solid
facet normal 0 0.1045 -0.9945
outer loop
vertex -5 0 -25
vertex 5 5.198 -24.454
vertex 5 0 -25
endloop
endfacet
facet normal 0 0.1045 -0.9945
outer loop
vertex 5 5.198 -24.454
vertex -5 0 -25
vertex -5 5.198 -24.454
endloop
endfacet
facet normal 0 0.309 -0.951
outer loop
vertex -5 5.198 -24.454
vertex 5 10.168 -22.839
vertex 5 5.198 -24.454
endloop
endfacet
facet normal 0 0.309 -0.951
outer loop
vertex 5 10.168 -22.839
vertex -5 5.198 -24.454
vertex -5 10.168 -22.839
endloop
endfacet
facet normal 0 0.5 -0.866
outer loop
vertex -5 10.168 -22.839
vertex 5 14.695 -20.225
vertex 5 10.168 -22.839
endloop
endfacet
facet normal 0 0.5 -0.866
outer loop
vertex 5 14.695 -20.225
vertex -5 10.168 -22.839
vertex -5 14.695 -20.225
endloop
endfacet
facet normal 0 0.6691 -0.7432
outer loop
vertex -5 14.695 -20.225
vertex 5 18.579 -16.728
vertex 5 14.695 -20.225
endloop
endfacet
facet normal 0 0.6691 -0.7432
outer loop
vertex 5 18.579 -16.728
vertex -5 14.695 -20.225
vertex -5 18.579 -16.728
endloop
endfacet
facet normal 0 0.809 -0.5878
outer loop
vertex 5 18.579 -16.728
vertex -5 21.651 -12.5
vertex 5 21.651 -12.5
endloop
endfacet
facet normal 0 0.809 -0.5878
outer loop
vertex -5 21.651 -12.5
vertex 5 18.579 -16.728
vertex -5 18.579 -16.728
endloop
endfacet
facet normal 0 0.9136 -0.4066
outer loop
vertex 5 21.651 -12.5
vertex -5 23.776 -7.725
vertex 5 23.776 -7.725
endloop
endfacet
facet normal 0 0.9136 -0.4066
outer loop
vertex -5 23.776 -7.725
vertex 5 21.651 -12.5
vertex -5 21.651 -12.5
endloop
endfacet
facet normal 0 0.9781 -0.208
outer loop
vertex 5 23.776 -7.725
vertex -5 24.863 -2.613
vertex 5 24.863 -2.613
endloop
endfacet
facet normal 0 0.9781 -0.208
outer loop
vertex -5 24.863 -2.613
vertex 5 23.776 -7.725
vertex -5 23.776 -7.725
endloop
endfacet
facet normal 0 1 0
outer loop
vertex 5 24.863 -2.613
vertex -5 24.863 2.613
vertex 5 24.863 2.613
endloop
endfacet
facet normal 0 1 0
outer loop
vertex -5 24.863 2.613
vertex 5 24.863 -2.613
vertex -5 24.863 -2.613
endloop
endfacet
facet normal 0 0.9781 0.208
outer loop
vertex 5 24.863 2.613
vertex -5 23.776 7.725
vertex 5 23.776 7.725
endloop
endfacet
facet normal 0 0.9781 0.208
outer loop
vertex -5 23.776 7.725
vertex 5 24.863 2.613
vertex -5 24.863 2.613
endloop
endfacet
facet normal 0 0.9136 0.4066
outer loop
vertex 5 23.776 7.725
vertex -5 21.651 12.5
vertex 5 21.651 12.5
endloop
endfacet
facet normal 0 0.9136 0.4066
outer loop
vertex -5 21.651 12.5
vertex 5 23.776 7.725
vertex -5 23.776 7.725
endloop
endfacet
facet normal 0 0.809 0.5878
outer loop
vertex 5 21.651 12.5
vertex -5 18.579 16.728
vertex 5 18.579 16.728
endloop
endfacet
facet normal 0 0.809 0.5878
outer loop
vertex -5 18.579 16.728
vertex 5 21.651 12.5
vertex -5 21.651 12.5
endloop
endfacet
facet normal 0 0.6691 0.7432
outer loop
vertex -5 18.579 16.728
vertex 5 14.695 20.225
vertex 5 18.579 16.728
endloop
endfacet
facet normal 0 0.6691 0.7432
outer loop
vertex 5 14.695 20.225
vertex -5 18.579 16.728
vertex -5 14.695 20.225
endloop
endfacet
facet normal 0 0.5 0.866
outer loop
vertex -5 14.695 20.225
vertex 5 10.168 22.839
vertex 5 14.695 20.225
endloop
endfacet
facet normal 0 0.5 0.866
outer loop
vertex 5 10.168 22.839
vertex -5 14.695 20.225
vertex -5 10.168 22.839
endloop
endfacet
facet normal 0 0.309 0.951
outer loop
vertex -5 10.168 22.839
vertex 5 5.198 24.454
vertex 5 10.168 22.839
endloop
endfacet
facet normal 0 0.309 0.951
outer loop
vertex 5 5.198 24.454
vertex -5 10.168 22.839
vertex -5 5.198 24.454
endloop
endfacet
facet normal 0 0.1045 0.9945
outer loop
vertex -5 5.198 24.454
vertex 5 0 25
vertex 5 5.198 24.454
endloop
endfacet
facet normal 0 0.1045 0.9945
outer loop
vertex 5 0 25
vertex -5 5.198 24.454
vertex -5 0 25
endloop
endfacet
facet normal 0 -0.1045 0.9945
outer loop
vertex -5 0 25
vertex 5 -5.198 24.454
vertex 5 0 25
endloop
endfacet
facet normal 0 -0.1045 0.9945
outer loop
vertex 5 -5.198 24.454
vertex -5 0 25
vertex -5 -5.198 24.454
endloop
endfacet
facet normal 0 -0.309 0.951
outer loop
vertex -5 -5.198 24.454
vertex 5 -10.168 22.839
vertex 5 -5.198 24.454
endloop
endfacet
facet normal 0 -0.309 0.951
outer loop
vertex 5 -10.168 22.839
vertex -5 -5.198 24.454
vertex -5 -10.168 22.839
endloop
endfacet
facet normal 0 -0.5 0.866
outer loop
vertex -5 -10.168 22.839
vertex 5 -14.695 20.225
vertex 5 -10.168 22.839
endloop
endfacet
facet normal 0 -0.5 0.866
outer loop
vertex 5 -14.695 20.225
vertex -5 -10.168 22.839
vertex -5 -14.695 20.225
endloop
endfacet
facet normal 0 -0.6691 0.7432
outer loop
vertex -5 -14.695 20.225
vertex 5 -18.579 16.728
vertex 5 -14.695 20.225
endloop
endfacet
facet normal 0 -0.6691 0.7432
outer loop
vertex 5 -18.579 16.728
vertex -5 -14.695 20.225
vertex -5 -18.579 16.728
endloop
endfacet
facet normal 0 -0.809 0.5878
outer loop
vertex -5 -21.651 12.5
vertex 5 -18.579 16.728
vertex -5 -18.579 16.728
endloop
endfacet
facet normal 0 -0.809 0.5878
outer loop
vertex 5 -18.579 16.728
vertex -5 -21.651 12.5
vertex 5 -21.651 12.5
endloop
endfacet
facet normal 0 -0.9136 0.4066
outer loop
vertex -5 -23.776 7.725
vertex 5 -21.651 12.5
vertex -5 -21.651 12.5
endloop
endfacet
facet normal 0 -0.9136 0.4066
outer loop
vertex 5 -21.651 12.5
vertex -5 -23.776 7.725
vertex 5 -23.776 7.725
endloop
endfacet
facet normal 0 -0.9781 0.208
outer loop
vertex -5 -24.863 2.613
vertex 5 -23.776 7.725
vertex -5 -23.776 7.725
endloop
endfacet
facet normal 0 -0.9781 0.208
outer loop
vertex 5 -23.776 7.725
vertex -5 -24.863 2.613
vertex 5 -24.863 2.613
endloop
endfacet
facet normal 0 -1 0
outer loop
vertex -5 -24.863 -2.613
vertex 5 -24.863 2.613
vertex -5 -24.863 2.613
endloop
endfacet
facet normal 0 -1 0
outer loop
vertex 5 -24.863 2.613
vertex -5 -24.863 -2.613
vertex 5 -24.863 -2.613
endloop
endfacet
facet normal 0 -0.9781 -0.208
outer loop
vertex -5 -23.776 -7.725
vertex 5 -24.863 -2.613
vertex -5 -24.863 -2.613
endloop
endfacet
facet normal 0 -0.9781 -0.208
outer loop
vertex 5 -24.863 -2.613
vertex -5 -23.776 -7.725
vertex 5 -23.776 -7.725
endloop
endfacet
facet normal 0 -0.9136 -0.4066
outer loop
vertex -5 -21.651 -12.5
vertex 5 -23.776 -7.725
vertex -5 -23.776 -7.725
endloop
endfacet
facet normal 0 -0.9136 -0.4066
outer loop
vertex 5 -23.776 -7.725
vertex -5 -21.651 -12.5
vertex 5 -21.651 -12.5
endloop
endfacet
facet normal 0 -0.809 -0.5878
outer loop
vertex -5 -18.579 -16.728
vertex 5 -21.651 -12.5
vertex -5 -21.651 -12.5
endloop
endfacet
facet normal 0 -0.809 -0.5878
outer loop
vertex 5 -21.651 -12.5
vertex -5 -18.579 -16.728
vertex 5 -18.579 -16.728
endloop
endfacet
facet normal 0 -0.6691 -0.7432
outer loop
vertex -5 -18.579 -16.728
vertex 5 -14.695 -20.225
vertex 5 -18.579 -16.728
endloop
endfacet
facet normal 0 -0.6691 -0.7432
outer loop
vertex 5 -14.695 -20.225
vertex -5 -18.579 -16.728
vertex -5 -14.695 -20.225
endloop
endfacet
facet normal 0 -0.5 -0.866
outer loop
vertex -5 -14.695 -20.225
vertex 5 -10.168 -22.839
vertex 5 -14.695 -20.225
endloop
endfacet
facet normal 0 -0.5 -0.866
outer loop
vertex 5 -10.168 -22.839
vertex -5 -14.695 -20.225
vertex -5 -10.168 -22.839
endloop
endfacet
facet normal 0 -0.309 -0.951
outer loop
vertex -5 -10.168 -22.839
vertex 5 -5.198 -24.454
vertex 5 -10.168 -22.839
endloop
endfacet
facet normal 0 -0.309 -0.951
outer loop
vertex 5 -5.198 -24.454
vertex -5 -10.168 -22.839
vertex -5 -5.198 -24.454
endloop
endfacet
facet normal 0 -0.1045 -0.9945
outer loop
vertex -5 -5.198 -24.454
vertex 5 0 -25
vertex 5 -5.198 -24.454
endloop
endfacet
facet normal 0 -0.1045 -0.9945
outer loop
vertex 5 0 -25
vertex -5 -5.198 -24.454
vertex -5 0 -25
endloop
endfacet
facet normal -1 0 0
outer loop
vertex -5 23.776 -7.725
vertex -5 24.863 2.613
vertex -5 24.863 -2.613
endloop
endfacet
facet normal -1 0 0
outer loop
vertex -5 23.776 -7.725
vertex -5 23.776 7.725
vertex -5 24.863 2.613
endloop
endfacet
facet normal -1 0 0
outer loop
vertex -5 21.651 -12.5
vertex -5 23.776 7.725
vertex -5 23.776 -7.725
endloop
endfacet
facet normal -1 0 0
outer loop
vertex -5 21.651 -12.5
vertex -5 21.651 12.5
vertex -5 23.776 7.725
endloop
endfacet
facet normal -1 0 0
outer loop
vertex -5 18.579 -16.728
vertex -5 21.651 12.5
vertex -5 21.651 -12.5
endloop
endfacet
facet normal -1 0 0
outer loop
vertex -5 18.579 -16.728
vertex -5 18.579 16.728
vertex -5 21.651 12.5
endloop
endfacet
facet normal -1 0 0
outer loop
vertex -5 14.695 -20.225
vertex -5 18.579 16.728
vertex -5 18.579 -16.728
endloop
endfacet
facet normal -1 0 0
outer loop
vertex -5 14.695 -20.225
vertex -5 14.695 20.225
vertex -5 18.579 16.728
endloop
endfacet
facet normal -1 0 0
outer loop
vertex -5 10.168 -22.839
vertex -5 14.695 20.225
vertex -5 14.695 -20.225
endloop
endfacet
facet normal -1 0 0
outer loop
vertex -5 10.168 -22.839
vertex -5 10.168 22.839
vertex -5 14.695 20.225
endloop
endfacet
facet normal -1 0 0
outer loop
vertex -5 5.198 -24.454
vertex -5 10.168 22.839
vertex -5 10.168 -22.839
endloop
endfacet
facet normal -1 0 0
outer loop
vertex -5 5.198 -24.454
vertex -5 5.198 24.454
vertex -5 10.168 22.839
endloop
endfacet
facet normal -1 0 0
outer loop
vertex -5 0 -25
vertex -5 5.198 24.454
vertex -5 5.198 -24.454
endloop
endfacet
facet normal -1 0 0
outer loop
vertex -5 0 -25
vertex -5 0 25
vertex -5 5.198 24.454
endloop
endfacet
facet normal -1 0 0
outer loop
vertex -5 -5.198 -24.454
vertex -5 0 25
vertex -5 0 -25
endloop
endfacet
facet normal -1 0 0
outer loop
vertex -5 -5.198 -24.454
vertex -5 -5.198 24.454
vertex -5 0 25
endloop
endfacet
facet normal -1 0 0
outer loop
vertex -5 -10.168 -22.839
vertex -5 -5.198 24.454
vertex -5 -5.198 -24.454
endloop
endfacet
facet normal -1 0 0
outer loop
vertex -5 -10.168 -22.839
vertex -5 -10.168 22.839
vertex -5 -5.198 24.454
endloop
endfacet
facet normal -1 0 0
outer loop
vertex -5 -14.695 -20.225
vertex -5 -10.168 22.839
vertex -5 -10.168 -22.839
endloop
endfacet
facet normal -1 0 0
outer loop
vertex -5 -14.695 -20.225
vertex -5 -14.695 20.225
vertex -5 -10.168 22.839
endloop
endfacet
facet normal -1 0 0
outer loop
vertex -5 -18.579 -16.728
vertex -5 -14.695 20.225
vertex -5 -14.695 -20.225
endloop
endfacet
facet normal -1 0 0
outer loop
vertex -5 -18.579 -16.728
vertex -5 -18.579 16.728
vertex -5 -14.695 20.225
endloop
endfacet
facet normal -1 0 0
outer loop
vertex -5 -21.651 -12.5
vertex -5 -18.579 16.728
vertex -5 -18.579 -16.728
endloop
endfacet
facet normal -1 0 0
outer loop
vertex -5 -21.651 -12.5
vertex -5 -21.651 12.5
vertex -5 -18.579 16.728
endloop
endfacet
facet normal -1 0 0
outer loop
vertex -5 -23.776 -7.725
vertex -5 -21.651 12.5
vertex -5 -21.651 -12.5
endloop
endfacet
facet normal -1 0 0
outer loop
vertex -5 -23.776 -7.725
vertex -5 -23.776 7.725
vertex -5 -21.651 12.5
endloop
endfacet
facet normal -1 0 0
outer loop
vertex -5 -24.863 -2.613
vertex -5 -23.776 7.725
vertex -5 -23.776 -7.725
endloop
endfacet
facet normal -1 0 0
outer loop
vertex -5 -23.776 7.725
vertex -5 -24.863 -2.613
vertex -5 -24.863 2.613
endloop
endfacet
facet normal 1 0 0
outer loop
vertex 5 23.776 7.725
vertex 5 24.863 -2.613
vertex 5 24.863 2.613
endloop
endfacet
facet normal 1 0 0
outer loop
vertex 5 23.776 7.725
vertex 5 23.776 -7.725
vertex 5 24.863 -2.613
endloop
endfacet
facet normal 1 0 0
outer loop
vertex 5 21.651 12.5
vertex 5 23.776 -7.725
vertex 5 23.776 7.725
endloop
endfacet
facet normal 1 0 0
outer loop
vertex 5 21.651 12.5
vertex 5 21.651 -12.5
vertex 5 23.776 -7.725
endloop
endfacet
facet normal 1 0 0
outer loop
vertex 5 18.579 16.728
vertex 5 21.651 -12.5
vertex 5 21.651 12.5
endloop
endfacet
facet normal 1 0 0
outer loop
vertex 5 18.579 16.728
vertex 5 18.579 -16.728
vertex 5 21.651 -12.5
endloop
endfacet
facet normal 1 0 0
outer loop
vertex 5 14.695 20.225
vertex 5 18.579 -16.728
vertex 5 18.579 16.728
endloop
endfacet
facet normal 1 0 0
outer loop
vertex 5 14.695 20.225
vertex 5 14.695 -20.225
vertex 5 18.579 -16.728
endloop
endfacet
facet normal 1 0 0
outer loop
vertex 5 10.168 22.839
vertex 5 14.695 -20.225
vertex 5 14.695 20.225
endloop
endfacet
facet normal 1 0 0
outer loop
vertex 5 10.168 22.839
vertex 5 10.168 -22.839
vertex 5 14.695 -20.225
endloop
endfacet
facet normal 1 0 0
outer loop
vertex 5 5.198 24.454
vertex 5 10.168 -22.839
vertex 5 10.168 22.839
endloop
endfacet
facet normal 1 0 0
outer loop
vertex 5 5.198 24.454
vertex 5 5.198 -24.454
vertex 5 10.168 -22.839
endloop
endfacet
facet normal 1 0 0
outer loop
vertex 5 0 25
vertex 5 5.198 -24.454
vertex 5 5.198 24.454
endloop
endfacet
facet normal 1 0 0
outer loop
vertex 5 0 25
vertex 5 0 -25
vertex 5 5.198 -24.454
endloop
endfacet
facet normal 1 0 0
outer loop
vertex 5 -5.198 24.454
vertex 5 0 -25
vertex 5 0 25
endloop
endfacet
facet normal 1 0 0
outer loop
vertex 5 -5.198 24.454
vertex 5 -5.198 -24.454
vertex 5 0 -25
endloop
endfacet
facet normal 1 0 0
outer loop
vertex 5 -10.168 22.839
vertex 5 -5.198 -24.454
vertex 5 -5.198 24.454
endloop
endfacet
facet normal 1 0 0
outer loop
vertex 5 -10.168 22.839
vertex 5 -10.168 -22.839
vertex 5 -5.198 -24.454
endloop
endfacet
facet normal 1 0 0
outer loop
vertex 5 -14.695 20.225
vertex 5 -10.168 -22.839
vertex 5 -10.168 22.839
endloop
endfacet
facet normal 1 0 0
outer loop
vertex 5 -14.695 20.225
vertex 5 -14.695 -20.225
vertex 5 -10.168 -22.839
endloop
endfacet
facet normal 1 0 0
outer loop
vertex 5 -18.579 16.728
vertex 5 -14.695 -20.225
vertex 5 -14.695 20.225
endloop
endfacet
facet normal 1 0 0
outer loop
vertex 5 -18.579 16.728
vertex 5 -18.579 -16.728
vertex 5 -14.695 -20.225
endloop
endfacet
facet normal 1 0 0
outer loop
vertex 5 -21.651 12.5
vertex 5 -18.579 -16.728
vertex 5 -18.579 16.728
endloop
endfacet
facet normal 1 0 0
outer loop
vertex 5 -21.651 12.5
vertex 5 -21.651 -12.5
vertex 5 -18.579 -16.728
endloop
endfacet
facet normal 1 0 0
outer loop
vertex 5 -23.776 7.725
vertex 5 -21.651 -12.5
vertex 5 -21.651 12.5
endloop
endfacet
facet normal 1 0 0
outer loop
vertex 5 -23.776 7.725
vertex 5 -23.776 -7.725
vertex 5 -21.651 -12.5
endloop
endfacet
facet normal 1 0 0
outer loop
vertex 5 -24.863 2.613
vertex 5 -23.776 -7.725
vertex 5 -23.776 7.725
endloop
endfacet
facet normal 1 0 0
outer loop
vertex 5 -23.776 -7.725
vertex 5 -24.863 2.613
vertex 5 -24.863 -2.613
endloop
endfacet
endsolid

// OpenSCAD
// file: settings.scad
// Common settings used by all scad files.

// ALL UNITS IN MILLIMETERS (MM)!!!

$fn = 30;//low-res but fast to render
//$fn = 50;//higher-res but slow to render

pi = 3.1415926535897932384626433832795;

max_footprint = 150; // 15x15 cm

bottom_clearance = 10;
bottom_clearance = 25.4/2+10;
//bottom_clearance = 30;

shell_alpha = 0.215;
//shell_alpha = 1.0;

tolerance = 0.5;

// Flat countersunk M2.5mm x 0.45mm machine screw.
screw_thread_diameter = 2.5;//2.8;//2.75;//2.4?
screw_thread_length = 5;//?
screw_head_diameter = 4.75; // M2.5
//screw_head_diameter = 5.2; // M3
screw_head_height = 1.5;//2;

screw_thread_diameter2 = 2;

unit_thickness = 5;
u = unit_thickness;

shell_thickness = unit_thickness;

// Show flags.
show_platform = 0;
show_head = 1;
show_head_shell = 0;
show_head_electronics_bb = 0;
show_battery = 1;
show_foot_cube = 0;
show_torso = 0;
show_motor = 0;
show_motor_plates = 1;
show_motor_inner_plates = 1;
show_motor_outer_plates = 1;
show_wheel = 0;//obsolete
show_tracks = 1;//
show_track_wheels = 1;
show_caster = 0;
show_rpi = 1;
show_vertical_plates = 1;//
show_horizontal_plates = 1;//
show_caster_plates = 0;//obsolete?
show_camera = 1;
show_screen = 0;
show_edge_mount = 1;
show_sonar_mount = 1;
show_recharge_mount = 1;
show_conduit = 1;
show_torso_shell = 1;
show_recharge_dock = 0;
show_head_tilt_axis = 0;
show_rpi_camera_axis = 0;
show_laser_axis = 0;

head_vertical_angle_tilt = 0;
//head_vertical_angle_tilt = 30;//max
//head_vertical_angle_tilt = 10;

torso_height = 120+20;

base_plate_diameter = max_footprint-unit_thickness*2;
base_plate_frame = 0;

head_height = 50;
head_offset_z = max_footprint/2;
head_middle_cutout = 85;

rpi_with_four_hats_and_clearance = 76;

qrd1114_w = 6.10;
qrd1114_l = 4.39;
qrd1114_h = 4.65;

dock_radius = 10;
dock_gripper_border = 2;
dock_gripper_instep = 0.9;
dock_gripper_cutout_tapper = 50;
dock_receiver_height = 5;

// Patriod Fuel+ 9000 mAh
battery_length = 90;
battery_width = 57;
battery_height = 23;
battery_offset_z = 30;//4;

wheel_diameter = 50;
wheel_offset_x = 65;
wheel_offset_z = wheel_diameter/2;
wheel_axle_diameter = 5;

//caster_diameter = 19.05; // 0.75 inches
caster_diameter = 25.45; // 1 inches
//caster_diameter = 15.875; // 5/8 inches
caster_holder_diameter = 30;//31;
caster_offset_y = base_plate_diameter/2 - caster_holder_diameter/2;

arduino_offset_x = 0;
arduino_offset_y = 0;
arduino_offset_z = 67;
arduino_offset_x2 = 0;
arduino_offset_y2 = -20;
arduino_offset_z2 = torso_height+bottom_clearance;

horizontal_plate_width = unit_thickness*8*2 - unit_thickness*2;
horizontal_plate_depth = unit_thickness*8*2;

vertical_plate_width = horizontal_plate_depth;
vertical_plate_height = unit_thickness*8;
vertical_plate_offset_x = wheel_offset_x-22.5;
vertical_plate_offset_z = vertical_plate_height/2 + unit_thickness/2;

vertical_battery_plate_height = 100 - 15;

caster_plate_width = horizontal_plate_width + unit_thickness*2;
caster_plate_mount_length = unit_thickness*4;
caster_plate_width_minor = caster_holder_diameter;

motor_switch_length = 20;
motor_switch_thickness = 6.5;
motor_switch_height = 11;
motor_switch_height_leads = 23;
motor_switch_on_height =  13.3;
motor_switch_hole_diameter = 2.5;
motor_switch_hole_offset_z = 6.5;//this plus diameter/2 is hole center from switch top
motor_switch_hole_spacing = 7.1;// holes are diameter/2 from this

motor_length = 60;
motor_width = 25;
motor_collar_width = 7;
motor_collar_height = 2.5;
motor_axle_width = 4;
motor_axle_height = 9.5;
motor_offset_x = 10;
//motor_offset_y = motor_width/2+5;
motor_offset_y = unit_thickness*3.5;
motor_offset_z = vertical_plate_height/2 - unit_thickness/2;//4;//30;
motor_mount_holes_dist = 17;
// motor countersink hole
motor_mount_holes_width = 3; // M3
motor_mount_holes_head_height = 2.2;
motor_mount_holes_head_width = 5.8;
motor_bearing_outer_diameter = 10;
motor_bearing_inner_diameter = 5.95;
motor_bearing_thickness = 2.5;

motor_unimount_idler_axle_d = screw_thread_diameter;
//motor_unimount_spacer_depth = 0.1;//too small
motor_unimount_spacer_depth = 0.5;

motor_arm_offset_y = -u*3;
motor_arm_offset_z = u*.5;

motor_plate_width = vertical_plate_width;
motor_plate_height = vertical_plate_height;
motor_plate_thickness = unit_thickness;
motor_plate_offset_z = vertical_plate_offset_z;

motor_plate_middle_thickness = 5;

wheel_hub_offset = u*3;

motor_hole_height_offset = -5;

nylon_spacer_outer_diameter = 6.35;
nylon_spacer_inner_diameter = 3.302;
nylon_spacer_length = 12.7;

track_width = unit_thickness*3;
track_offset_x = -50;
track_offset_z = .1;
//track_wheel_radius = 19;//original
track_wheel_radius = 14;
//track_wheel_hole_radius = (nylon_spacer_outer_diameter+1)/2;
track_wheel_hole_radius = motor_bearing_outer_diameter/2;

track_driver_hole_radius = (motor_axle_width)/2 + 0.1;
track_driver_set_screw_head_d = 4.1;
track_driver_set_screw_shaft_d = 2.4;
//track_wheel_width = 13.5;//original
track_wheel_width = u*2;
track_wheel_width_buffer = u*0.25;
track_offset = 3;        //distance from chassis
track_wheel_offset = track_offset;
//track_length = 250; // see tread_triangle.py, too big
//track_length = 240; // see tread_triangle.py
//track_length = 238; //inc/dec in 10 unit increments so notches match idlers
track_length = 228; //inc/dec in 10 unit increments so notches match idlers
track_radius = track_length/2/pi;
track_wheel_show_fancy = 1;
track_wheel_gap = track_wheel_width + track_wheel_width_buffer*2;
track_axle_bearing_diameter = motor_bearing_inner_diameter - 0.1;
track_tensioner_radius = 12;
track_nut_height = 3.5; //TODO
track_punchout_thickness = 0.25;//should be the same as the minimum layer thickness

head_slew_bearing_outer_diameter = 115;
head_slew_bearing_ring_thickness = 20;
head_slew_bearing_inner_diameter = head_slew_bearing_outer_diameter - head_slew_bearing_ring_thickness;
//head_slew_bearing_hole_diameter = head_slew_bearing_inner_diameter - head_slew_bearing_ring_thickness;
head_slew_bearing_hole_diameter = 12+tolerance; // slip ring https://www.adafruit.com/products/775
//head_slew_bearing_ball_diameter = 5;
head_slew_bearing_ball_diameter = 2.5; //u/2;
head_slew_bearing_height = u;//head_slew_bearing_ball_diameter*2;
head_slew_bearing_gap = 0.5;
head_slew_bearing_slew_gap = 0;
head_slew_bearing_gap_factor = 0.1;

neck_strut_width = u*7;
neck_strut_height = u*18;
neck_strut_spacing = u*8;

show_outer_race = 0;
show_inner_race_a = 1;
show_inner_race_b = 1;
show_balls = 0;
// main file
include <settings.scad>;

module make_wheel(){
    rotate([0,90,0])
    cylinder(h=10, d=wheel_diameter, center=true);
}

make_wheel();
